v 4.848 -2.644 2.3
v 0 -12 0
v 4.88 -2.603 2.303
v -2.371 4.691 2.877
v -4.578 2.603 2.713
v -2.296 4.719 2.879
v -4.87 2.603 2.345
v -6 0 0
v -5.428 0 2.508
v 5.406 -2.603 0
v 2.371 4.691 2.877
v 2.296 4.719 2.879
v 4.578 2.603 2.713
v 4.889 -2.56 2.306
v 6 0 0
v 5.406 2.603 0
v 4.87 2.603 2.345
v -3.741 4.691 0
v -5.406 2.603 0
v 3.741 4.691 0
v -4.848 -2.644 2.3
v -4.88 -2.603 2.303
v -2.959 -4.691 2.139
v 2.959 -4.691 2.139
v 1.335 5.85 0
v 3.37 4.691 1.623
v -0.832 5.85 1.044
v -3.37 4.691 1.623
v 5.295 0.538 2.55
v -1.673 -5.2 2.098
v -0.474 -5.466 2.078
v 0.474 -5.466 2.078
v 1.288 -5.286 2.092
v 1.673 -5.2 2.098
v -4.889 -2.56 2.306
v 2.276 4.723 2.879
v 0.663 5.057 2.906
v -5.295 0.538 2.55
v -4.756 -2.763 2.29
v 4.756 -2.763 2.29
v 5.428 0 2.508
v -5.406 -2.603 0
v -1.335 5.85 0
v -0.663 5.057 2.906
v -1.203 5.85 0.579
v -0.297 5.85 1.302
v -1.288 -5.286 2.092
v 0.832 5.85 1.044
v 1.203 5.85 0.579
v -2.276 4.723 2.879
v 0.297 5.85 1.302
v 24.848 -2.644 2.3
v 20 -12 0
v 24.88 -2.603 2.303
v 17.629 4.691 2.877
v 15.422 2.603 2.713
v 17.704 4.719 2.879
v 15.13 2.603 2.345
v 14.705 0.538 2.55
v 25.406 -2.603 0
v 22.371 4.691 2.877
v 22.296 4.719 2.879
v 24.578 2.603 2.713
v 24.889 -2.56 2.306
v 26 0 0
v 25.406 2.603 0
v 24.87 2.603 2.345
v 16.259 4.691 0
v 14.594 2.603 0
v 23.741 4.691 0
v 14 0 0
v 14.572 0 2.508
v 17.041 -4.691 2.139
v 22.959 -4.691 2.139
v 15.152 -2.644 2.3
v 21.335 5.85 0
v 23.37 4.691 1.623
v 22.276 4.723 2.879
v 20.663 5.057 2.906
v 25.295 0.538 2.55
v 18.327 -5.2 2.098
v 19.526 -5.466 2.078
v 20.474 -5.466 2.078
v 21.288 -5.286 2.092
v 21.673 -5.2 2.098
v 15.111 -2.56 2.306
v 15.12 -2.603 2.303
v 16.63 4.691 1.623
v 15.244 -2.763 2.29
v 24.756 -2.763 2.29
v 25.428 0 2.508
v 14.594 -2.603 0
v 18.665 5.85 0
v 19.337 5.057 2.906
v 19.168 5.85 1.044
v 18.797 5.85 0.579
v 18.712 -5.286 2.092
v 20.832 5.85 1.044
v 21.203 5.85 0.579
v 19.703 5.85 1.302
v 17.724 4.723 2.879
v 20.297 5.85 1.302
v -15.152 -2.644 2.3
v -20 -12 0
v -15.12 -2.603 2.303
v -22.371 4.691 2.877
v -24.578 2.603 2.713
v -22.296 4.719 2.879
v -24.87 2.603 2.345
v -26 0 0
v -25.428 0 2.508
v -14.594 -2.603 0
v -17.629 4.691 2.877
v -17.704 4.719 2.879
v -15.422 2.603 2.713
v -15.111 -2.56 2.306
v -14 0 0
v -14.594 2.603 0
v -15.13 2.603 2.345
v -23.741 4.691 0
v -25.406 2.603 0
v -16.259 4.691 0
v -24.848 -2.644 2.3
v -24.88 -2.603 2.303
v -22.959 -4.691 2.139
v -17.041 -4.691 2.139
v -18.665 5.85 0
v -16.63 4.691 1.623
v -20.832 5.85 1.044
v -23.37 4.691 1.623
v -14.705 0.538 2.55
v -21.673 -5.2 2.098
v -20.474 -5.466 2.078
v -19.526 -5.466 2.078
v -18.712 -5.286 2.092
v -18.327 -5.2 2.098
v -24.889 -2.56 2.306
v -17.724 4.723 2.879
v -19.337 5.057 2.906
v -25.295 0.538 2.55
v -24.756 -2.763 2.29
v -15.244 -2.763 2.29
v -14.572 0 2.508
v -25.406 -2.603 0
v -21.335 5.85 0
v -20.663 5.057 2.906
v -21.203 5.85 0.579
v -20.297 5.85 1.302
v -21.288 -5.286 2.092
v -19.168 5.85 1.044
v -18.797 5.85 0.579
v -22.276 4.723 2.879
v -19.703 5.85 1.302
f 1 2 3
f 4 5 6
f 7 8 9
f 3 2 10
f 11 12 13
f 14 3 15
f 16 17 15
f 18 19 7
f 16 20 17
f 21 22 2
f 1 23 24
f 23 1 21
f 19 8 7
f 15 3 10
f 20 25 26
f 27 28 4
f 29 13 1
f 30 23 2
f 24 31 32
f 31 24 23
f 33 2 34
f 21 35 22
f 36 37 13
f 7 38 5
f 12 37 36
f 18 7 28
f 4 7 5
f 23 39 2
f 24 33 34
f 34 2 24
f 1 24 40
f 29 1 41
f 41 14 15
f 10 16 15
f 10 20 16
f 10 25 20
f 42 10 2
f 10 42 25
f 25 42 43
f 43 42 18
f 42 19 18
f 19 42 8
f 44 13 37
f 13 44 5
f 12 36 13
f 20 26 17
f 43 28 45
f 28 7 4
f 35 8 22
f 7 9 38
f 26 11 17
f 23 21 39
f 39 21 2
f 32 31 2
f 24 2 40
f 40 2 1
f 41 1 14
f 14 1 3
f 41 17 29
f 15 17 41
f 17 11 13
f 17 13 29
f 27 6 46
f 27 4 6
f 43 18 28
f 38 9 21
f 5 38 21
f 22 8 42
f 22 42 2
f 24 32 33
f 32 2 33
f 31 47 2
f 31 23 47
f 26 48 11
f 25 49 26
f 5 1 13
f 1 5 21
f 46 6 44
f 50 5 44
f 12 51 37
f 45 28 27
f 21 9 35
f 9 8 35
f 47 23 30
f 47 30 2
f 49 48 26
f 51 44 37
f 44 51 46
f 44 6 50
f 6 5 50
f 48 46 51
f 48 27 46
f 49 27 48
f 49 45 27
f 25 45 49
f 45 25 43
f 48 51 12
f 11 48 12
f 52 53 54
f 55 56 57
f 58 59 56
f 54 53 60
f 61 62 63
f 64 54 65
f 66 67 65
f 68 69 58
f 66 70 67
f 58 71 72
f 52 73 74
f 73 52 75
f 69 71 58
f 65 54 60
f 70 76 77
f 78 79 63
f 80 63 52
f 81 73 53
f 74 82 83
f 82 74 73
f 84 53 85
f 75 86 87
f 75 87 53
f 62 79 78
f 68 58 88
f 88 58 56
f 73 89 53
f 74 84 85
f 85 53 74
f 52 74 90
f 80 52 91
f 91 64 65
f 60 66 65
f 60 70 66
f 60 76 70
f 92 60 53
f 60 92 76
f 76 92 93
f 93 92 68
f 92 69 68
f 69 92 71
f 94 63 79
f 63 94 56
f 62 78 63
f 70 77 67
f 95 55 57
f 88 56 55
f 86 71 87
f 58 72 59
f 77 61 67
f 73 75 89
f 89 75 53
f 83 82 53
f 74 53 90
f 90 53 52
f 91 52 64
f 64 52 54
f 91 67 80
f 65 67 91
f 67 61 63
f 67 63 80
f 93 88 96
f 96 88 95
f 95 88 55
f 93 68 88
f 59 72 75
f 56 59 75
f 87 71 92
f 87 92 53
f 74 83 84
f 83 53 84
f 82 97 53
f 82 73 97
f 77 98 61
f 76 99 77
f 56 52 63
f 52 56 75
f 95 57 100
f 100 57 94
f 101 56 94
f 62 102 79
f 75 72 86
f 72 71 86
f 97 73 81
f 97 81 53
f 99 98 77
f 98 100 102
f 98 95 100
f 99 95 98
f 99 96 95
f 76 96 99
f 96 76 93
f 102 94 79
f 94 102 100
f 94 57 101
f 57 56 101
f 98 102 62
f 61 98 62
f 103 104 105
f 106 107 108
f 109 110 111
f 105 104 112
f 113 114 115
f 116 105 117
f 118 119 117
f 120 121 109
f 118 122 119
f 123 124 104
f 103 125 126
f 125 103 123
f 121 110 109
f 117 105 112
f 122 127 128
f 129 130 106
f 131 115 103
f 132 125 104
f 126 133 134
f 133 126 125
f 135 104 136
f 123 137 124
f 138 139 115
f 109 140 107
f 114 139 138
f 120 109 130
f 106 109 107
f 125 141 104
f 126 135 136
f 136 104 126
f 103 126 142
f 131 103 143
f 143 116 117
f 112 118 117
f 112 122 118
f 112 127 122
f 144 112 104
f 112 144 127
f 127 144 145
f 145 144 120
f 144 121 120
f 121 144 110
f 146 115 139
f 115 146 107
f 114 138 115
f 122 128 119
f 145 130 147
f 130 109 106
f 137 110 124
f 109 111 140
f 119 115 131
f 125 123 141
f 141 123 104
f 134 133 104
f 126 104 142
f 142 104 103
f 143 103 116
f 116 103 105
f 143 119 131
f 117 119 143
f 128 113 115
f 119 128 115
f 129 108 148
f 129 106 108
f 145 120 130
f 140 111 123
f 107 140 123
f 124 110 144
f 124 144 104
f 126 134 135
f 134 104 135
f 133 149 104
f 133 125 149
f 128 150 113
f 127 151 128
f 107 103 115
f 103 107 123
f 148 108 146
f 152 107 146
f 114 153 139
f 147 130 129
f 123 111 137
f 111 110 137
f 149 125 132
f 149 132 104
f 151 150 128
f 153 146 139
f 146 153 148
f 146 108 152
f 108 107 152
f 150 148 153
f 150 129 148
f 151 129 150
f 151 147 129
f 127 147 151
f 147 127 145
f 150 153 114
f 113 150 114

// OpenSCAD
// file: common.scad
/*********************************************
* Common modules for Scepter of Light
*********************************************/

// render a tear shaped gem
module tear_gem(radius, tip_offset, height) {
    hull($fn=14) {
        difference() {
            union() {
                sphere(r=radius);
                cylinder(h=tip_offset, r1=radius/2, r2=0);
            }
            translate([-radius,-radius,-radius]) cube([radius*2, radius, radius+tip_offset]);
            rotate([4.5,0,0]) translate([-radius,height,-radius]) cube([radius*2, radius-height, radius+tip_offset]);
        };
    };
}

// render a seat for a tear gem
module tear_gem_seat(radius, tip_offset, height) {
    render() {
        difference() {
            tear_gem_seat_outline(radius, tip_offset, height);
            translate([0,0,1]) linear_extrude(height) {
                gem_2d(radius+0.25, tip_offset+0.25);
            };
        }
    }
}

module tear_gem_seat_outline(radius, tip_offset, height) {
    render() {
        difference() {
            minkowski(convexity=3) {
                sphere(r=height/2);
                linear_extrude(1) {
                    gem_2d(radius, tip_offset, 50);
                }
            };
            translate([-radius*2, -radius*2, -height]) cube([(radius+tip_offset)*2, radius*4, height]);
        }
    }
}

module gem_2d(radius, tip_offset, numsides=14) {
    hull($fn=numsides) {
        circle(r=radius);
        translate([tip_offset-((radius/10)/2), 0, 0]) circle(r=radius/10, $fn=3);
    }
}

// center a cube in the xy plane
module centred_xy_cube(dims) {
    translate([-(dims.x/2), -(dims.y/2), 0]) cube(dims);
}

// put child objects in a ring - quite proud of this one :)
module make_ring(ringradius, count) {
    drawangle = 360/count;
    for(item = [0 : count]) {
        a = drawangle * item;
        translate([ringradius * cos(a), ringradius * sin(a)]) rotate([0,0,270+a]) children();
    }
}
// main file
use <common.scad>

// gems for hilt
rotate([90,0,0]) tear_gem(6, 12, 2.5);

translate([20,0,0]) rotate([90,0,0]) tear_gem(6, 12, 2.5);

translate([-20,0,0]) rotate([90,0,0]) tear_gem(6, 12, 2.5);

// gems for head
//...
